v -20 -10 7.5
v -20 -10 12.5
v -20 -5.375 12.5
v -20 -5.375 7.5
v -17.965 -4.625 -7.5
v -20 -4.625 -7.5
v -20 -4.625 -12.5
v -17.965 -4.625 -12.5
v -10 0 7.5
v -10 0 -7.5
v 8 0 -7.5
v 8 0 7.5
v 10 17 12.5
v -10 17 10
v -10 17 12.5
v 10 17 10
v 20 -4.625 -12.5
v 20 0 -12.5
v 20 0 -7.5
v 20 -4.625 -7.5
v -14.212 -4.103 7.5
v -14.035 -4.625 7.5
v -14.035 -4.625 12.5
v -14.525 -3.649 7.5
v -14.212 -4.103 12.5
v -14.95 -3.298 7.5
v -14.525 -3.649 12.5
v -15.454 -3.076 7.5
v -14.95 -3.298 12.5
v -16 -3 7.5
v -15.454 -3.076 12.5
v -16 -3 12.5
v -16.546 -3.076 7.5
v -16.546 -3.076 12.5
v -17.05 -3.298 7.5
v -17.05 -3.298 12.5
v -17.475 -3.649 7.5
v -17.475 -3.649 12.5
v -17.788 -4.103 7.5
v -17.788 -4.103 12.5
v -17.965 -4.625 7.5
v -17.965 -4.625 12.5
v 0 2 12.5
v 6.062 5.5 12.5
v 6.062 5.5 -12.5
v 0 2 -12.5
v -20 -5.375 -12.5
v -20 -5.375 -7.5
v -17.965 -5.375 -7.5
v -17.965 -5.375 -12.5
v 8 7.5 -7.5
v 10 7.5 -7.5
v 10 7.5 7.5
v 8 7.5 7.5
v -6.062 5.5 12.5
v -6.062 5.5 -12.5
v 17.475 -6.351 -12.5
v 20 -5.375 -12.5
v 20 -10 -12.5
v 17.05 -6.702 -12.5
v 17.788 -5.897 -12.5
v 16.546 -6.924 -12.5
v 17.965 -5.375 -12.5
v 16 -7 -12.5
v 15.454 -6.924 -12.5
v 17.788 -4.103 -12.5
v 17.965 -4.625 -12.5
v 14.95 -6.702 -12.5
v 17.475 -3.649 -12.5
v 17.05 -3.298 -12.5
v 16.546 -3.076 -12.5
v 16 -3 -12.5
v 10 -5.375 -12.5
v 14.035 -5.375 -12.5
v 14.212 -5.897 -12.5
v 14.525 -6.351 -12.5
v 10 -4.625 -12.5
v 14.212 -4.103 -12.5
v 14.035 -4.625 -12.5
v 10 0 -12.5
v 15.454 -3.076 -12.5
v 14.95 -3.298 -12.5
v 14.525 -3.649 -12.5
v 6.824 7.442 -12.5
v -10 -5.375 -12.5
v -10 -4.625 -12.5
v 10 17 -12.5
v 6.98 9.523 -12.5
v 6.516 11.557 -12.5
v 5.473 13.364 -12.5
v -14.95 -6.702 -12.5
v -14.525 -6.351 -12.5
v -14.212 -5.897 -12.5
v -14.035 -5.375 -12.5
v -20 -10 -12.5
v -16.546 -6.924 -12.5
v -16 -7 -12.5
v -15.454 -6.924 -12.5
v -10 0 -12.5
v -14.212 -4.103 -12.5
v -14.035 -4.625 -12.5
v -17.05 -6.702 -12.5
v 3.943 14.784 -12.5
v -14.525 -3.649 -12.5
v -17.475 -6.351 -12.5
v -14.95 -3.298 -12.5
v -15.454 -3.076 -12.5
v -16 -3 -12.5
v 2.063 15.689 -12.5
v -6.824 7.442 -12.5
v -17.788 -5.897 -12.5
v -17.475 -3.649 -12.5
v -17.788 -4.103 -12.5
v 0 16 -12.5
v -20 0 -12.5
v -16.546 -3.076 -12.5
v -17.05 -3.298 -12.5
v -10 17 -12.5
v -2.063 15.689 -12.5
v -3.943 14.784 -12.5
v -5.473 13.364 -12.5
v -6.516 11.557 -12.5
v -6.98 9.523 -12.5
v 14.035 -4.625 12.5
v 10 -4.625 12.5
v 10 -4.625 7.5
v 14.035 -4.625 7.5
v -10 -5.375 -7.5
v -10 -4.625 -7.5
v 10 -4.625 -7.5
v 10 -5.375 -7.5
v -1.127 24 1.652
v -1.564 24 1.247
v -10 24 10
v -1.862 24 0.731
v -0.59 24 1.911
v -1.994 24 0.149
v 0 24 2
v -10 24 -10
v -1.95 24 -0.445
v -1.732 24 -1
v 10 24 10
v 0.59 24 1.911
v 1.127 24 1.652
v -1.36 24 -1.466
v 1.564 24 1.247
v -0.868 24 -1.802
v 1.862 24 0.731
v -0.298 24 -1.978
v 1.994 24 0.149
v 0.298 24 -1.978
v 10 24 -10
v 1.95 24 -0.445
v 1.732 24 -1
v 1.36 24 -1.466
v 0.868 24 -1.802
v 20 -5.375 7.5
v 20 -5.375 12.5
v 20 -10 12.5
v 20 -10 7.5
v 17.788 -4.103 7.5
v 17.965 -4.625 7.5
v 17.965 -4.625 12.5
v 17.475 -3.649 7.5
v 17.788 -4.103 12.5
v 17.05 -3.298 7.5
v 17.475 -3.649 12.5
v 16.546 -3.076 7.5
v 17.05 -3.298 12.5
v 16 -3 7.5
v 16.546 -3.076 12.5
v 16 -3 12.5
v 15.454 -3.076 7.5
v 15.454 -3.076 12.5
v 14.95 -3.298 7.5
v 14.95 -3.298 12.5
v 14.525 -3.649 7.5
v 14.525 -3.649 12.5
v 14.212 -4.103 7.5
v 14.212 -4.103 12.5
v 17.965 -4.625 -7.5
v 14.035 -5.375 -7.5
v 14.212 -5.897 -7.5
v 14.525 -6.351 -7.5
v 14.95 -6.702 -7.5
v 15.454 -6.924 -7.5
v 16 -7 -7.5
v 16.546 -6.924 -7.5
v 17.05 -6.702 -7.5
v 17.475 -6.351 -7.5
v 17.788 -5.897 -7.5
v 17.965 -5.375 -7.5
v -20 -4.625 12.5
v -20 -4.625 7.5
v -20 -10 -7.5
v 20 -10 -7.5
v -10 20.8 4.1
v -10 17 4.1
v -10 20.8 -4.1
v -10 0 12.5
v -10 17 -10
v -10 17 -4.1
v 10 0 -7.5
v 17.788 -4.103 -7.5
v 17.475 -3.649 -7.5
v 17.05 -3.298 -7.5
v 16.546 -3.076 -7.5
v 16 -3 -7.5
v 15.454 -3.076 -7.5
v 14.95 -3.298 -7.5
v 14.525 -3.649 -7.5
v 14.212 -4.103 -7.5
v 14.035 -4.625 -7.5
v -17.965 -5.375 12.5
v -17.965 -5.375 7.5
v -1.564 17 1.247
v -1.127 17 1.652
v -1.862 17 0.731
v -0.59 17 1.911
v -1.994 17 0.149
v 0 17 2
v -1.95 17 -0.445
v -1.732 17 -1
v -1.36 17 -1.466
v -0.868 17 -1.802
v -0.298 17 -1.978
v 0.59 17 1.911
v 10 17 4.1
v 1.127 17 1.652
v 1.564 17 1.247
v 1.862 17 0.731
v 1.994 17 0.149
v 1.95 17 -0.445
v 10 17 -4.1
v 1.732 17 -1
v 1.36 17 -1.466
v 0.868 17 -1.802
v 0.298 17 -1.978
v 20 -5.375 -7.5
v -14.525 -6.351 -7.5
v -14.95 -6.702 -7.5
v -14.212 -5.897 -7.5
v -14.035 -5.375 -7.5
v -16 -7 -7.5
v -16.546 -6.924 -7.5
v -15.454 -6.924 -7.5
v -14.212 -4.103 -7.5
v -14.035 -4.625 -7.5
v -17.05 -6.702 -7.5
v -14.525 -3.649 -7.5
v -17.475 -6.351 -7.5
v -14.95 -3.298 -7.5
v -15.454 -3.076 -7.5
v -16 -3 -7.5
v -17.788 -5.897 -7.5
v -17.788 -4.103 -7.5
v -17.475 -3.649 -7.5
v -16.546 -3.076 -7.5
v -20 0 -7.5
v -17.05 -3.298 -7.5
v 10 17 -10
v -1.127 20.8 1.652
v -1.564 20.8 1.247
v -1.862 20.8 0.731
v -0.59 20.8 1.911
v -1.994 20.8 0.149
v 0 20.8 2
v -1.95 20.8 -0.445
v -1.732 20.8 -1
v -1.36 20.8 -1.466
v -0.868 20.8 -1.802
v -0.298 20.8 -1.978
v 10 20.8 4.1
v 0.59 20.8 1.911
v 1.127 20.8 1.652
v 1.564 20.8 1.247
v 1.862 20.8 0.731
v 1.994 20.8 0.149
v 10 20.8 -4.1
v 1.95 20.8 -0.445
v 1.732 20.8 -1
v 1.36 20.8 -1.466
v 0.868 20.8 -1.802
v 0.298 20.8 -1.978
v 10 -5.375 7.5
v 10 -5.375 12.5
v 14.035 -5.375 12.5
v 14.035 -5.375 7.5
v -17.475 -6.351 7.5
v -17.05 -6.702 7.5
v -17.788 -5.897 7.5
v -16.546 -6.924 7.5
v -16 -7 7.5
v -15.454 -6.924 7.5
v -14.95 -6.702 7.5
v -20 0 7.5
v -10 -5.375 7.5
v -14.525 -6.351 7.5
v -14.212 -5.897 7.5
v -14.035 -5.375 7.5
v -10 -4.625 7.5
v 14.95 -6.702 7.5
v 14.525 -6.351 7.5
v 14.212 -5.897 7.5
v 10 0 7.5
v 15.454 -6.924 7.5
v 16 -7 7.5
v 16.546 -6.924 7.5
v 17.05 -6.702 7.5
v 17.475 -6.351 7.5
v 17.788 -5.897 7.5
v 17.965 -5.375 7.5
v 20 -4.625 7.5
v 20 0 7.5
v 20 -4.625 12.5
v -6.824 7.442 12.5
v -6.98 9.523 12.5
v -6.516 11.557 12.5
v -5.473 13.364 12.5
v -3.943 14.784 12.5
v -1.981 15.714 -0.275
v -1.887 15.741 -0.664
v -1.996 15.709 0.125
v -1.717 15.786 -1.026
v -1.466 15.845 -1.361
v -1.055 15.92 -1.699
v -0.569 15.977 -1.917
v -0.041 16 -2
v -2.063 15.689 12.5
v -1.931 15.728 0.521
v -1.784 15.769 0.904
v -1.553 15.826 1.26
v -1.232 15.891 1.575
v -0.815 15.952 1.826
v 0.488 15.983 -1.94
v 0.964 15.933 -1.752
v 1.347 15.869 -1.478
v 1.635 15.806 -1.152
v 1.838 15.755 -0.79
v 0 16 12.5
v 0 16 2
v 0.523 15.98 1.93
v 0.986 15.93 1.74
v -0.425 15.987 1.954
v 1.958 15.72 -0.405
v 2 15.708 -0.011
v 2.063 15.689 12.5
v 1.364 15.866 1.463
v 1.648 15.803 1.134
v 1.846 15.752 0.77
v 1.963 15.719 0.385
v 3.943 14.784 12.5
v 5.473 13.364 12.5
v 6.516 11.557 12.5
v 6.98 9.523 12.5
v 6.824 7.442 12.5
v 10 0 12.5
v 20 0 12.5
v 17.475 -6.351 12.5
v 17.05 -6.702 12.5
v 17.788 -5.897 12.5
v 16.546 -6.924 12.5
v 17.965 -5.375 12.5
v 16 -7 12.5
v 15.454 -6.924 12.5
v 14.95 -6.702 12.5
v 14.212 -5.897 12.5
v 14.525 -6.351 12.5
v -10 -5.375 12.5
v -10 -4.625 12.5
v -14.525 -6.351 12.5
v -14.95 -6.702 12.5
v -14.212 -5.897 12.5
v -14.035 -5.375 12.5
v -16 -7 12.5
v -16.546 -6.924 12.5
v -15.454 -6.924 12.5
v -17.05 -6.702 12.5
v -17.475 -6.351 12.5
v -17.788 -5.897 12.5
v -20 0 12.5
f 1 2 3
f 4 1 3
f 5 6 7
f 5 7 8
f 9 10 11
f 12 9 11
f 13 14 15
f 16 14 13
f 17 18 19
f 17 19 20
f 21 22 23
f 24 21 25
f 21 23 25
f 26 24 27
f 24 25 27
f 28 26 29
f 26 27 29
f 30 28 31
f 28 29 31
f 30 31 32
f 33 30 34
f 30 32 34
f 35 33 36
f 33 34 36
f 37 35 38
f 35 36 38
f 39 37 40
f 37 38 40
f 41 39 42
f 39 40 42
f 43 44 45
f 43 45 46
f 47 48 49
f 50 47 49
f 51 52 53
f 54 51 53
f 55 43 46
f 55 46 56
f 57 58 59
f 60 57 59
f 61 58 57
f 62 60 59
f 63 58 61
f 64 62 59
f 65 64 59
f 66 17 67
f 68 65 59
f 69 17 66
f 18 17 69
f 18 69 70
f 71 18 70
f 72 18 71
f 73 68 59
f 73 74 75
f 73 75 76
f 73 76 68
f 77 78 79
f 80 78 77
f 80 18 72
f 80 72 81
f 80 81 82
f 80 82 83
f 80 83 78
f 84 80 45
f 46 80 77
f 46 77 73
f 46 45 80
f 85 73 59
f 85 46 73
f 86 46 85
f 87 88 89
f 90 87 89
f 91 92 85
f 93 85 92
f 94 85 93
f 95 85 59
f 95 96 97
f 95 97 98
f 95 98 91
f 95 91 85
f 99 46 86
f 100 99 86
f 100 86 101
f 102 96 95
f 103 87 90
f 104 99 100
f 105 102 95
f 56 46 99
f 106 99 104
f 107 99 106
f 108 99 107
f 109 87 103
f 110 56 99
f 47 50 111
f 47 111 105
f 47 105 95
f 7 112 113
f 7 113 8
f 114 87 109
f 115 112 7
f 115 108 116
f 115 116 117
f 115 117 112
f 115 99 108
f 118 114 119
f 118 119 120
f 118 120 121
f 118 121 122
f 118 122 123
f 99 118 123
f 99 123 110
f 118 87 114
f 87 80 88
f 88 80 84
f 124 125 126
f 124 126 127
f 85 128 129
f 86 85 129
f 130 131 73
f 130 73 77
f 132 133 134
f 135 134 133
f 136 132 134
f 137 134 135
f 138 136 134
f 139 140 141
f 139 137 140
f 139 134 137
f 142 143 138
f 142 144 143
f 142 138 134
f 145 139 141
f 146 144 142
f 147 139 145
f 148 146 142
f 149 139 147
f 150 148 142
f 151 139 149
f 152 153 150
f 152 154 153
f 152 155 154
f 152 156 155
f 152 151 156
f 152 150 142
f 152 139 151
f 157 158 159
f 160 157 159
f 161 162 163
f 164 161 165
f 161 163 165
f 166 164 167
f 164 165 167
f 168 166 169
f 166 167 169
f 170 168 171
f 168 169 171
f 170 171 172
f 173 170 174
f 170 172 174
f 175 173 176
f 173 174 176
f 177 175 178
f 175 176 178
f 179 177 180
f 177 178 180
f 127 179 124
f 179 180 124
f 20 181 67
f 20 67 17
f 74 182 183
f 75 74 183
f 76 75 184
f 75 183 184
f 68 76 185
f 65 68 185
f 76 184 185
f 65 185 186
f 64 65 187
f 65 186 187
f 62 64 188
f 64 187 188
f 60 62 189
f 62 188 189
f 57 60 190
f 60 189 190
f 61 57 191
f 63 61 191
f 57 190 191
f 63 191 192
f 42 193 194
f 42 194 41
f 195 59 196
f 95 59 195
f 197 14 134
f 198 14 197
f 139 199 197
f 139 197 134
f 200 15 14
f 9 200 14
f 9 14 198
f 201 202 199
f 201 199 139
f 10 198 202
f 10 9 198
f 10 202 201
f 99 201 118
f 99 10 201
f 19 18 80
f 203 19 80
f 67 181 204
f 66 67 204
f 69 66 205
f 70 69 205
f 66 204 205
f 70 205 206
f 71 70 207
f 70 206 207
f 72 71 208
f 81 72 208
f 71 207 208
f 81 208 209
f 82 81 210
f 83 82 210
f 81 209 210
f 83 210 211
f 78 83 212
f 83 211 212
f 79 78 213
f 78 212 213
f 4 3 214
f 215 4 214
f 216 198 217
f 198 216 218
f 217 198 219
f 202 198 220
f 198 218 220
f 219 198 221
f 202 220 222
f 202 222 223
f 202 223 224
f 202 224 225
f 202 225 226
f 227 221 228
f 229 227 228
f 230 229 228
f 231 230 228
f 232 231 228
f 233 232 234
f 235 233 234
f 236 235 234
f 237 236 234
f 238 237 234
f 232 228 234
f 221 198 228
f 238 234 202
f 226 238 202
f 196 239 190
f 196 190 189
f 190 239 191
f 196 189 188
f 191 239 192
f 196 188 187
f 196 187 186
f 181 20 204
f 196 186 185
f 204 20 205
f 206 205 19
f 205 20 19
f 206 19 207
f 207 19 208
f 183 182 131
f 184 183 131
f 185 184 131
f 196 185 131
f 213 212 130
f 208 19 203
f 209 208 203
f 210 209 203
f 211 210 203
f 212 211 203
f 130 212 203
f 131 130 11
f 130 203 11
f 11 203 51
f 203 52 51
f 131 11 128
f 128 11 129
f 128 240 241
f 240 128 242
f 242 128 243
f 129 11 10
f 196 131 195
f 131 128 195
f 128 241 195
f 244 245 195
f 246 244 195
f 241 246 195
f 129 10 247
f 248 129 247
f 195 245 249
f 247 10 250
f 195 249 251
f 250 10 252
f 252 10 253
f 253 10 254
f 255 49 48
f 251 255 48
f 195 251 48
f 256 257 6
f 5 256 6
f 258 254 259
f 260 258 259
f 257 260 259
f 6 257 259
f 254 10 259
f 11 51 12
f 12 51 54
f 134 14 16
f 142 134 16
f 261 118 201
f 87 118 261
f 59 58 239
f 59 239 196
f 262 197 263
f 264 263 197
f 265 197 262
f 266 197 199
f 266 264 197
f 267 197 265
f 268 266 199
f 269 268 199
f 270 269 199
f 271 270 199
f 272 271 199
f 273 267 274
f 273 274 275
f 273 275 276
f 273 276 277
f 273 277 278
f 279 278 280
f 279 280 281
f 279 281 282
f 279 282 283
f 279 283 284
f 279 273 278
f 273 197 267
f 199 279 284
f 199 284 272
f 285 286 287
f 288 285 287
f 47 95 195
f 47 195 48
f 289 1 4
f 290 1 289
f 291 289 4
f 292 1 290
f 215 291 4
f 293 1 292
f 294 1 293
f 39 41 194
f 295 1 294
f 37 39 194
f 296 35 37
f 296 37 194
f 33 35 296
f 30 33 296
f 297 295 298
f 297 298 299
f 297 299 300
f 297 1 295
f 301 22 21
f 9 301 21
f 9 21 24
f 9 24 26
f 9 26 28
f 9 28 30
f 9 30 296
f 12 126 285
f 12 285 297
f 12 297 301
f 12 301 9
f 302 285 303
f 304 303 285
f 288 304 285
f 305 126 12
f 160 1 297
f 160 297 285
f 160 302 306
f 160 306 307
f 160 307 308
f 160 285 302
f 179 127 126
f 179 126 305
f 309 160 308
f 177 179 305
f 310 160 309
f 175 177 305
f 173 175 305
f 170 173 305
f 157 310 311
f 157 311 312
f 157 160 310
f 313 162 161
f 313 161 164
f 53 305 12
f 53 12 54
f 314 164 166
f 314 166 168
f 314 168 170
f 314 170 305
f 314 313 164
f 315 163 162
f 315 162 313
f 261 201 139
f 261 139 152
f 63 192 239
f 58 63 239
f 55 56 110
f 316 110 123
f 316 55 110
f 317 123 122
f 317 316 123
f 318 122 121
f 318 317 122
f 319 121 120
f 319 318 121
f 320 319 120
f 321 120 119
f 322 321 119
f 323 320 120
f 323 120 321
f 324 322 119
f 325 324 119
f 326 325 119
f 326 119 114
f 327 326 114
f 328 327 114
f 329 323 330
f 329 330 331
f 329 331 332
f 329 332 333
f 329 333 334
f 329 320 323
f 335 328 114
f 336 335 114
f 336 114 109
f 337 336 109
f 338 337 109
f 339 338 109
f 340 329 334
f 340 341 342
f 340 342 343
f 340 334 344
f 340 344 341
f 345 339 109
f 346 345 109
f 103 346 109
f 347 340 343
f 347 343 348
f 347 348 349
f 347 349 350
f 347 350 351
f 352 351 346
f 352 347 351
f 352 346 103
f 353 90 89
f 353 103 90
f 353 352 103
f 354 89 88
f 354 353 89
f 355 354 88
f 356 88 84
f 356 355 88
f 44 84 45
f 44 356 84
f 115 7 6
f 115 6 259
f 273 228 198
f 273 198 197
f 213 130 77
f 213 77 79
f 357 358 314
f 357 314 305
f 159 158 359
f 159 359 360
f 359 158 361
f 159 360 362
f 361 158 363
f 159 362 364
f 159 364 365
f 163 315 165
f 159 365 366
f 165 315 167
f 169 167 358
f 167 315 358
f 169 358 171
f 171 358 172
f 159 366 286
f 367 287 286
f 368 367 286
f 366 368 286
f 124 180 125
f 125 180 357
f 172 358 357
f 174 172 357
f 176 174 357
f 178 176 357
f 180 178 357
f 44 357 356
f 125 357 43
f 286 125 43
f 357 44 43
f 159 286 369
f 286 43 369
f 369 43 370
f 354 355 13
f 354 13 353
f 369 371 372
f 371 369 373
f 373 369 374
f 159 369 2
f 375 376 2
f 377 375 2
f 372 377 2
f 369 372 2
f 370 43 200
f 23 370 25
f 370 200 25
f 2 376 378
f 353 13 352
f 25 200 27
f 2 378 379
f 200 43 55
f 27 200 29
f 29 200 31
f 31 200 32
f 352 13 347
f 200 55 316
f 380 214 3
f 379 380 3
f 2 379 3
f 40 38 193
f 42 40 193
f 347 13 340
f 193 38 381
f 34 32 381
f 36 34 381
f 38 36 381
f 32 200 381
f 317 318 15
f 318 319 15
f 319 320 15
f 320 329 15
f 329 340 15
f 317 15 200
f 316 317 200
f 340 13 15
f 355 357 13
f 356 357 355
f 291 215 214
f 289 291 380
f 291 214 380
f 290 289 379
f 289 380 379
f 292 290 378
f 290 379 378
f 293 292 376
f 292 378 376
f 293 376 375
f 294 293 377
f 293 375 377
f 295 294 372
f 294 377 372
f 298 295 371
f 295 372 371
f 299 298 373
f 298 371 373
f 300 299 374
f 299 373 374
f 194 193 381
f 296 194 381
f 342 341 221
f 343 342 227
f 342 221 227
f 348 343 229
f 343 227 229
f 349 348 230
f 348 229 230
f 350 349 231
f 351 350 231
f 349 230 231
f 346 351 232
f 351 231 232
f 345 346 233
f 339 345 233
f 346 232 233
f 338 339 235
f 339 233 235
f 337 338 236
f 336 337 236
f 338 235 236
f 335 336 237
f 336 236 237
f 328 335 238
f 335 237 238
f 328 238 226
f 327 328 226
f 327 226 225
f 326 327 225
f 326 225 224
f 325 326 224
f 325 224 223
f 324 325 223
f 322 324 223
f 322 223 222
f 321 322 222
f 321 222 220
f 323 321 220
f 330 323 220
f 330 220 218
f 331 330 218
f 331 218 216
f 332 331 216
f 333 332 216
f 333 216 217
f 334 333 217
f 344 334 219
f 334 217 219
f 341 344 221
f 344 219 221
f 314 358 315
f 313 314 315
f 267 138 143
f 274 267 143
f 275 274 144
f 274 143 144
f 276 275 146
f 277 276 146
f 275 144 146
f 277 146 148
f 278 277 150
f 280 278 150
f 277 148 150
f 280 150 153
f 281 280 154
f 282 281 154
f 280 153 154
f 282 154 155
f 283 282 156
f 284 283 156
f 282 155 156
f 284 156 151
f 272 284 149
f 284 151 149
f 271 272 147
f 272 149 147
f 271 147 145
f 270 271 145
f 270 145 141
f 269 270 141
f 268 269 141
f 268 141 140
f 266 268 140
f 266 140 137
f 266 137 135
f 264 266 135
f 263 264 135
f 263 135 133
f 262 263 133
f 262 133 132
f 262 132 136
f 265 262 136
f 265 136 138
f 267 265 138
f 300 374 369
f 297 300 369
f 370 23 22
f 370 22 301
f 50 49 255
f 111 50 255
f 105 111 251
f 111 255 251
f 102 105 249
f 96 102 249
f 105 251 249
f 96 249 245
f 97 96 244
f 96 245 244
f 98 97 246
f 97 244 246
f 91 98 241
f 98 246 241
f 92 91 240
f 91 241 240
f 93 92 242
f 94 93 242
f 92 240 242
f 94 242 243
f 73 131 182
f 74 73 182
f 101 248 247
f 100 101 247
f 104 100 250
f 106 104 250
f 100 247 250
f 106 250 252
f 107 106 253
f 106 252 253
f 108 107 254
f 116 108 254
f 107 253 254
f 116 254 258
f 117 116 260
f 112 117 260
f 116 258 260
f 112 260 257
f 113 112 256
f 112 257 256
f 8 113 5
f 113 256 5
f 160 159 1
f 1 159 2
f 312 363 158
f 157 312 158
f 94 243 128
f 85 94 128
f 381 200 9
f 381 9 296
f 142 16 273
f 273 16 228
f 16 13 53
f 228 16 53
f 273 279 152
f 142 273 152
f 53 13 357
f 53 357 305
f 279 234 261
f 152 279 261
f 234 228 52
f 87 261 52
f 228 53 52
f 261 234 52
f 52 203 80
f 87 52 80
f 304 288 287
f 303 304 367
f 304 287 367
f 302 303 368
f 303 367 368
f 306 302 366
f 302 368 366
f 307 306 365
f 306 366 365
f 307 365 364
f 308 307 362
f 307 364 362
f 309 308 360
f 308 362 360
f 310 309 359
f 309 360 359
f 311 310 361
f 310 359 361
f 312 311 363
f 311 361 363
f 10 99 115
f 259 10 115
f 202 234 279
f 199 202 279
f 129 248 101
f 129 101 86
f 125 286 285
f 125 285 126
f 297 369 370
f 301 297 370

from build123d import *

# Parameters (mm, degrees)
SKETCH1_W               = 20
SKETCH1_H               = 25
BOSS_EXTRUDE1_DEPTH     = 17
CUT_EXTRUDE1_DEPTH      = 32.843366656
BOSS_EXTRUDE2_DEPTH     = 5
SKETCH4_R               = 2
CUT_EXTRUDE2_DEPTH      = 37.249137921
SKETCH6_W               = 20
SKETCH6_H               = 20
BOSS_EXTRUDE3_DEPTH     = 7
SKETCH8_W               = 8.2
SKETCH8_H               = 3.8
CUT_EXTRUDE3_DEPTH      = 41.401113846
CUT_EXTRUDE4_REACH      = 43.379
CUT_EXTRUDE4_END_RADIUS = 7
SKETCH7_R               = 2
SKETCH9_W               = 15
SKETCH9_H               = 7.5
CUT_EXTRUDE5_DEPTH      = 2
SKETCH10_W              = 10
SKETCH10_H              = 0.75
CUT_EXTRUDE6_DEPTH      = 41.01249811


with BuildPart() as part:
    # Sketch1 → Boss-Extrude1 (new body)
    with BuildSketch(Plane(origin=(0, 0, 0), x_dir=(1, 0, 0), z_dir=(0, 1, 0))):
        Rectangle(SKETCH1_W, SKETCH1_H)
    extrude(amount=BOSS_EXTRUDE1_DEPTH)

    # Sketch2 → Cut-Extrude1 (cut, through all)
    with BuildSketch(Plane.XY.offset(12.5)):
        with BuildLine():
            Line((0, 2), (-6.062177826, 5.5))
            ThreePointArc((-6.062177826, 5.5), (0, 16), (6.062177826, 5.5))
            Line((6.062177826, 5.5), (0, 2))
        make_face()
    extrude(amount=-CUT_EXTRUDE1_DEPTH, mode=Mode.SUBTRACT)

    # Sketch3 → Boss-Extrude2 (add)
    with BuildSketch(Plane.XY.offset(12.5)):
        Polygon((10, 0), (20, 0), (20, -10), (-20, -10), (-20, 0), (-10, 0), align=None)
    boss_extrude2 = extrude(amount=-BOSS_EXTRUDE2_DEPTH)

    # Mirror1: Boss-Extrude2 across plane
    add(boss_extrude2.mirror(Plane.XY))

    # Sketch4 → Cut-Extrude2 (cut, through all)
    with BuildSketch(Plane.XY.offset(12.5)):
        with Locations((16, -5)):
            Circle(SKETCH4_R)
        with Locations((-16, -5)):
            Circle(SKETCH4_R)
    extrude(amount=-CUT_EXTRUDE2_DEPTH, mode=Mode.SUBTRACT)

    # Sketch6 → Boss-Extrude3 (add)
    with BuildSketch(Plane(origin=(0, 17, 0), x_dir=(1, 0, 0), z_dir=(0, 1, 0))):
        Rectangle(SKETCH6_W, SKETCH6_H)
    extrude(amount=BOSS_EXTRUDE3_DEPTH)

    # Sketch8 → Cut-Extrude3 (cut, through all)
    with BuildSketch(Plane(origin=(10, 0, 0), x_dir=(0, 0, -1), z_dir=(1, 0, 0))):
        with Locations((0, 18.9)):
            Rectangle(SKETCH8_W, SKETCH8_H)
    extrude(amount=-CUT_EXTRUDE3_DEPTH, mode=Mode.SUBTRACT)

    # Cut-Extrude4: up to this cylinder (the profile starts outside it)
    cut_extrude4_end = Plane(origin=(0, 9, 0), z_dir=(0, 0, 1)) * Cylinder(CUT_EXTRUDE4_END_RADIUS, 101.758, mode=Mode.PRIVATE)
    # Sketch7 → Cut-Extrude4 (cut, up to the surface)
    with BuildSketch(Plane(origin=(0, 24, 0), x_dir=(1, 0, 0), z_dir=(0, 1, 0)), mode=Mode.PRIVATE) as cut_extrude4_sk1:
        with Locations(Location((0, 0, 0), (0, 0, 270))):
            Circle(SKETCH7_R)
    cut_extrude4_tool1 = extrude(cut_extrude4_sk1.sketch, amount=-CUT_EXTRUDE4_REACH, mode=Mode.PRIVATE) - cut_extrude4_end
    add(cut_extrude4_tool1.solids().sort_by_distance((0, 24, 0))[0], mode=Mode.SUBTRACT)

    # Sketch9 → Cut-Extrude5 (cut)
    with BuildSketch(Plane.ZY.offset(-10)):
        with Locations((0, 3.75)):
            Rectangle(SKETCH9_W, SKETCH9_H)
    extrude(amount=CUT_EXTRUDE5_DEPTH, mode=Mode.SUBTRACT)

    # Sketch10 → Cut-Extrude6 (cut, through all)
    with BuildSketch(Plane.XY.offset(12.5)):
        with Locations((-15, -5)):
            Rectangle(SKETCH10_W, SKETCH10_H)
        with Locations((15, -5)):
            Rectangle(SKETCH10_W, SKETCH10_H)
    extrude(amount=-CUT_EXTRUDE6_DEPTH, mode=Mode.SUBTRACT)


solid = part.part
